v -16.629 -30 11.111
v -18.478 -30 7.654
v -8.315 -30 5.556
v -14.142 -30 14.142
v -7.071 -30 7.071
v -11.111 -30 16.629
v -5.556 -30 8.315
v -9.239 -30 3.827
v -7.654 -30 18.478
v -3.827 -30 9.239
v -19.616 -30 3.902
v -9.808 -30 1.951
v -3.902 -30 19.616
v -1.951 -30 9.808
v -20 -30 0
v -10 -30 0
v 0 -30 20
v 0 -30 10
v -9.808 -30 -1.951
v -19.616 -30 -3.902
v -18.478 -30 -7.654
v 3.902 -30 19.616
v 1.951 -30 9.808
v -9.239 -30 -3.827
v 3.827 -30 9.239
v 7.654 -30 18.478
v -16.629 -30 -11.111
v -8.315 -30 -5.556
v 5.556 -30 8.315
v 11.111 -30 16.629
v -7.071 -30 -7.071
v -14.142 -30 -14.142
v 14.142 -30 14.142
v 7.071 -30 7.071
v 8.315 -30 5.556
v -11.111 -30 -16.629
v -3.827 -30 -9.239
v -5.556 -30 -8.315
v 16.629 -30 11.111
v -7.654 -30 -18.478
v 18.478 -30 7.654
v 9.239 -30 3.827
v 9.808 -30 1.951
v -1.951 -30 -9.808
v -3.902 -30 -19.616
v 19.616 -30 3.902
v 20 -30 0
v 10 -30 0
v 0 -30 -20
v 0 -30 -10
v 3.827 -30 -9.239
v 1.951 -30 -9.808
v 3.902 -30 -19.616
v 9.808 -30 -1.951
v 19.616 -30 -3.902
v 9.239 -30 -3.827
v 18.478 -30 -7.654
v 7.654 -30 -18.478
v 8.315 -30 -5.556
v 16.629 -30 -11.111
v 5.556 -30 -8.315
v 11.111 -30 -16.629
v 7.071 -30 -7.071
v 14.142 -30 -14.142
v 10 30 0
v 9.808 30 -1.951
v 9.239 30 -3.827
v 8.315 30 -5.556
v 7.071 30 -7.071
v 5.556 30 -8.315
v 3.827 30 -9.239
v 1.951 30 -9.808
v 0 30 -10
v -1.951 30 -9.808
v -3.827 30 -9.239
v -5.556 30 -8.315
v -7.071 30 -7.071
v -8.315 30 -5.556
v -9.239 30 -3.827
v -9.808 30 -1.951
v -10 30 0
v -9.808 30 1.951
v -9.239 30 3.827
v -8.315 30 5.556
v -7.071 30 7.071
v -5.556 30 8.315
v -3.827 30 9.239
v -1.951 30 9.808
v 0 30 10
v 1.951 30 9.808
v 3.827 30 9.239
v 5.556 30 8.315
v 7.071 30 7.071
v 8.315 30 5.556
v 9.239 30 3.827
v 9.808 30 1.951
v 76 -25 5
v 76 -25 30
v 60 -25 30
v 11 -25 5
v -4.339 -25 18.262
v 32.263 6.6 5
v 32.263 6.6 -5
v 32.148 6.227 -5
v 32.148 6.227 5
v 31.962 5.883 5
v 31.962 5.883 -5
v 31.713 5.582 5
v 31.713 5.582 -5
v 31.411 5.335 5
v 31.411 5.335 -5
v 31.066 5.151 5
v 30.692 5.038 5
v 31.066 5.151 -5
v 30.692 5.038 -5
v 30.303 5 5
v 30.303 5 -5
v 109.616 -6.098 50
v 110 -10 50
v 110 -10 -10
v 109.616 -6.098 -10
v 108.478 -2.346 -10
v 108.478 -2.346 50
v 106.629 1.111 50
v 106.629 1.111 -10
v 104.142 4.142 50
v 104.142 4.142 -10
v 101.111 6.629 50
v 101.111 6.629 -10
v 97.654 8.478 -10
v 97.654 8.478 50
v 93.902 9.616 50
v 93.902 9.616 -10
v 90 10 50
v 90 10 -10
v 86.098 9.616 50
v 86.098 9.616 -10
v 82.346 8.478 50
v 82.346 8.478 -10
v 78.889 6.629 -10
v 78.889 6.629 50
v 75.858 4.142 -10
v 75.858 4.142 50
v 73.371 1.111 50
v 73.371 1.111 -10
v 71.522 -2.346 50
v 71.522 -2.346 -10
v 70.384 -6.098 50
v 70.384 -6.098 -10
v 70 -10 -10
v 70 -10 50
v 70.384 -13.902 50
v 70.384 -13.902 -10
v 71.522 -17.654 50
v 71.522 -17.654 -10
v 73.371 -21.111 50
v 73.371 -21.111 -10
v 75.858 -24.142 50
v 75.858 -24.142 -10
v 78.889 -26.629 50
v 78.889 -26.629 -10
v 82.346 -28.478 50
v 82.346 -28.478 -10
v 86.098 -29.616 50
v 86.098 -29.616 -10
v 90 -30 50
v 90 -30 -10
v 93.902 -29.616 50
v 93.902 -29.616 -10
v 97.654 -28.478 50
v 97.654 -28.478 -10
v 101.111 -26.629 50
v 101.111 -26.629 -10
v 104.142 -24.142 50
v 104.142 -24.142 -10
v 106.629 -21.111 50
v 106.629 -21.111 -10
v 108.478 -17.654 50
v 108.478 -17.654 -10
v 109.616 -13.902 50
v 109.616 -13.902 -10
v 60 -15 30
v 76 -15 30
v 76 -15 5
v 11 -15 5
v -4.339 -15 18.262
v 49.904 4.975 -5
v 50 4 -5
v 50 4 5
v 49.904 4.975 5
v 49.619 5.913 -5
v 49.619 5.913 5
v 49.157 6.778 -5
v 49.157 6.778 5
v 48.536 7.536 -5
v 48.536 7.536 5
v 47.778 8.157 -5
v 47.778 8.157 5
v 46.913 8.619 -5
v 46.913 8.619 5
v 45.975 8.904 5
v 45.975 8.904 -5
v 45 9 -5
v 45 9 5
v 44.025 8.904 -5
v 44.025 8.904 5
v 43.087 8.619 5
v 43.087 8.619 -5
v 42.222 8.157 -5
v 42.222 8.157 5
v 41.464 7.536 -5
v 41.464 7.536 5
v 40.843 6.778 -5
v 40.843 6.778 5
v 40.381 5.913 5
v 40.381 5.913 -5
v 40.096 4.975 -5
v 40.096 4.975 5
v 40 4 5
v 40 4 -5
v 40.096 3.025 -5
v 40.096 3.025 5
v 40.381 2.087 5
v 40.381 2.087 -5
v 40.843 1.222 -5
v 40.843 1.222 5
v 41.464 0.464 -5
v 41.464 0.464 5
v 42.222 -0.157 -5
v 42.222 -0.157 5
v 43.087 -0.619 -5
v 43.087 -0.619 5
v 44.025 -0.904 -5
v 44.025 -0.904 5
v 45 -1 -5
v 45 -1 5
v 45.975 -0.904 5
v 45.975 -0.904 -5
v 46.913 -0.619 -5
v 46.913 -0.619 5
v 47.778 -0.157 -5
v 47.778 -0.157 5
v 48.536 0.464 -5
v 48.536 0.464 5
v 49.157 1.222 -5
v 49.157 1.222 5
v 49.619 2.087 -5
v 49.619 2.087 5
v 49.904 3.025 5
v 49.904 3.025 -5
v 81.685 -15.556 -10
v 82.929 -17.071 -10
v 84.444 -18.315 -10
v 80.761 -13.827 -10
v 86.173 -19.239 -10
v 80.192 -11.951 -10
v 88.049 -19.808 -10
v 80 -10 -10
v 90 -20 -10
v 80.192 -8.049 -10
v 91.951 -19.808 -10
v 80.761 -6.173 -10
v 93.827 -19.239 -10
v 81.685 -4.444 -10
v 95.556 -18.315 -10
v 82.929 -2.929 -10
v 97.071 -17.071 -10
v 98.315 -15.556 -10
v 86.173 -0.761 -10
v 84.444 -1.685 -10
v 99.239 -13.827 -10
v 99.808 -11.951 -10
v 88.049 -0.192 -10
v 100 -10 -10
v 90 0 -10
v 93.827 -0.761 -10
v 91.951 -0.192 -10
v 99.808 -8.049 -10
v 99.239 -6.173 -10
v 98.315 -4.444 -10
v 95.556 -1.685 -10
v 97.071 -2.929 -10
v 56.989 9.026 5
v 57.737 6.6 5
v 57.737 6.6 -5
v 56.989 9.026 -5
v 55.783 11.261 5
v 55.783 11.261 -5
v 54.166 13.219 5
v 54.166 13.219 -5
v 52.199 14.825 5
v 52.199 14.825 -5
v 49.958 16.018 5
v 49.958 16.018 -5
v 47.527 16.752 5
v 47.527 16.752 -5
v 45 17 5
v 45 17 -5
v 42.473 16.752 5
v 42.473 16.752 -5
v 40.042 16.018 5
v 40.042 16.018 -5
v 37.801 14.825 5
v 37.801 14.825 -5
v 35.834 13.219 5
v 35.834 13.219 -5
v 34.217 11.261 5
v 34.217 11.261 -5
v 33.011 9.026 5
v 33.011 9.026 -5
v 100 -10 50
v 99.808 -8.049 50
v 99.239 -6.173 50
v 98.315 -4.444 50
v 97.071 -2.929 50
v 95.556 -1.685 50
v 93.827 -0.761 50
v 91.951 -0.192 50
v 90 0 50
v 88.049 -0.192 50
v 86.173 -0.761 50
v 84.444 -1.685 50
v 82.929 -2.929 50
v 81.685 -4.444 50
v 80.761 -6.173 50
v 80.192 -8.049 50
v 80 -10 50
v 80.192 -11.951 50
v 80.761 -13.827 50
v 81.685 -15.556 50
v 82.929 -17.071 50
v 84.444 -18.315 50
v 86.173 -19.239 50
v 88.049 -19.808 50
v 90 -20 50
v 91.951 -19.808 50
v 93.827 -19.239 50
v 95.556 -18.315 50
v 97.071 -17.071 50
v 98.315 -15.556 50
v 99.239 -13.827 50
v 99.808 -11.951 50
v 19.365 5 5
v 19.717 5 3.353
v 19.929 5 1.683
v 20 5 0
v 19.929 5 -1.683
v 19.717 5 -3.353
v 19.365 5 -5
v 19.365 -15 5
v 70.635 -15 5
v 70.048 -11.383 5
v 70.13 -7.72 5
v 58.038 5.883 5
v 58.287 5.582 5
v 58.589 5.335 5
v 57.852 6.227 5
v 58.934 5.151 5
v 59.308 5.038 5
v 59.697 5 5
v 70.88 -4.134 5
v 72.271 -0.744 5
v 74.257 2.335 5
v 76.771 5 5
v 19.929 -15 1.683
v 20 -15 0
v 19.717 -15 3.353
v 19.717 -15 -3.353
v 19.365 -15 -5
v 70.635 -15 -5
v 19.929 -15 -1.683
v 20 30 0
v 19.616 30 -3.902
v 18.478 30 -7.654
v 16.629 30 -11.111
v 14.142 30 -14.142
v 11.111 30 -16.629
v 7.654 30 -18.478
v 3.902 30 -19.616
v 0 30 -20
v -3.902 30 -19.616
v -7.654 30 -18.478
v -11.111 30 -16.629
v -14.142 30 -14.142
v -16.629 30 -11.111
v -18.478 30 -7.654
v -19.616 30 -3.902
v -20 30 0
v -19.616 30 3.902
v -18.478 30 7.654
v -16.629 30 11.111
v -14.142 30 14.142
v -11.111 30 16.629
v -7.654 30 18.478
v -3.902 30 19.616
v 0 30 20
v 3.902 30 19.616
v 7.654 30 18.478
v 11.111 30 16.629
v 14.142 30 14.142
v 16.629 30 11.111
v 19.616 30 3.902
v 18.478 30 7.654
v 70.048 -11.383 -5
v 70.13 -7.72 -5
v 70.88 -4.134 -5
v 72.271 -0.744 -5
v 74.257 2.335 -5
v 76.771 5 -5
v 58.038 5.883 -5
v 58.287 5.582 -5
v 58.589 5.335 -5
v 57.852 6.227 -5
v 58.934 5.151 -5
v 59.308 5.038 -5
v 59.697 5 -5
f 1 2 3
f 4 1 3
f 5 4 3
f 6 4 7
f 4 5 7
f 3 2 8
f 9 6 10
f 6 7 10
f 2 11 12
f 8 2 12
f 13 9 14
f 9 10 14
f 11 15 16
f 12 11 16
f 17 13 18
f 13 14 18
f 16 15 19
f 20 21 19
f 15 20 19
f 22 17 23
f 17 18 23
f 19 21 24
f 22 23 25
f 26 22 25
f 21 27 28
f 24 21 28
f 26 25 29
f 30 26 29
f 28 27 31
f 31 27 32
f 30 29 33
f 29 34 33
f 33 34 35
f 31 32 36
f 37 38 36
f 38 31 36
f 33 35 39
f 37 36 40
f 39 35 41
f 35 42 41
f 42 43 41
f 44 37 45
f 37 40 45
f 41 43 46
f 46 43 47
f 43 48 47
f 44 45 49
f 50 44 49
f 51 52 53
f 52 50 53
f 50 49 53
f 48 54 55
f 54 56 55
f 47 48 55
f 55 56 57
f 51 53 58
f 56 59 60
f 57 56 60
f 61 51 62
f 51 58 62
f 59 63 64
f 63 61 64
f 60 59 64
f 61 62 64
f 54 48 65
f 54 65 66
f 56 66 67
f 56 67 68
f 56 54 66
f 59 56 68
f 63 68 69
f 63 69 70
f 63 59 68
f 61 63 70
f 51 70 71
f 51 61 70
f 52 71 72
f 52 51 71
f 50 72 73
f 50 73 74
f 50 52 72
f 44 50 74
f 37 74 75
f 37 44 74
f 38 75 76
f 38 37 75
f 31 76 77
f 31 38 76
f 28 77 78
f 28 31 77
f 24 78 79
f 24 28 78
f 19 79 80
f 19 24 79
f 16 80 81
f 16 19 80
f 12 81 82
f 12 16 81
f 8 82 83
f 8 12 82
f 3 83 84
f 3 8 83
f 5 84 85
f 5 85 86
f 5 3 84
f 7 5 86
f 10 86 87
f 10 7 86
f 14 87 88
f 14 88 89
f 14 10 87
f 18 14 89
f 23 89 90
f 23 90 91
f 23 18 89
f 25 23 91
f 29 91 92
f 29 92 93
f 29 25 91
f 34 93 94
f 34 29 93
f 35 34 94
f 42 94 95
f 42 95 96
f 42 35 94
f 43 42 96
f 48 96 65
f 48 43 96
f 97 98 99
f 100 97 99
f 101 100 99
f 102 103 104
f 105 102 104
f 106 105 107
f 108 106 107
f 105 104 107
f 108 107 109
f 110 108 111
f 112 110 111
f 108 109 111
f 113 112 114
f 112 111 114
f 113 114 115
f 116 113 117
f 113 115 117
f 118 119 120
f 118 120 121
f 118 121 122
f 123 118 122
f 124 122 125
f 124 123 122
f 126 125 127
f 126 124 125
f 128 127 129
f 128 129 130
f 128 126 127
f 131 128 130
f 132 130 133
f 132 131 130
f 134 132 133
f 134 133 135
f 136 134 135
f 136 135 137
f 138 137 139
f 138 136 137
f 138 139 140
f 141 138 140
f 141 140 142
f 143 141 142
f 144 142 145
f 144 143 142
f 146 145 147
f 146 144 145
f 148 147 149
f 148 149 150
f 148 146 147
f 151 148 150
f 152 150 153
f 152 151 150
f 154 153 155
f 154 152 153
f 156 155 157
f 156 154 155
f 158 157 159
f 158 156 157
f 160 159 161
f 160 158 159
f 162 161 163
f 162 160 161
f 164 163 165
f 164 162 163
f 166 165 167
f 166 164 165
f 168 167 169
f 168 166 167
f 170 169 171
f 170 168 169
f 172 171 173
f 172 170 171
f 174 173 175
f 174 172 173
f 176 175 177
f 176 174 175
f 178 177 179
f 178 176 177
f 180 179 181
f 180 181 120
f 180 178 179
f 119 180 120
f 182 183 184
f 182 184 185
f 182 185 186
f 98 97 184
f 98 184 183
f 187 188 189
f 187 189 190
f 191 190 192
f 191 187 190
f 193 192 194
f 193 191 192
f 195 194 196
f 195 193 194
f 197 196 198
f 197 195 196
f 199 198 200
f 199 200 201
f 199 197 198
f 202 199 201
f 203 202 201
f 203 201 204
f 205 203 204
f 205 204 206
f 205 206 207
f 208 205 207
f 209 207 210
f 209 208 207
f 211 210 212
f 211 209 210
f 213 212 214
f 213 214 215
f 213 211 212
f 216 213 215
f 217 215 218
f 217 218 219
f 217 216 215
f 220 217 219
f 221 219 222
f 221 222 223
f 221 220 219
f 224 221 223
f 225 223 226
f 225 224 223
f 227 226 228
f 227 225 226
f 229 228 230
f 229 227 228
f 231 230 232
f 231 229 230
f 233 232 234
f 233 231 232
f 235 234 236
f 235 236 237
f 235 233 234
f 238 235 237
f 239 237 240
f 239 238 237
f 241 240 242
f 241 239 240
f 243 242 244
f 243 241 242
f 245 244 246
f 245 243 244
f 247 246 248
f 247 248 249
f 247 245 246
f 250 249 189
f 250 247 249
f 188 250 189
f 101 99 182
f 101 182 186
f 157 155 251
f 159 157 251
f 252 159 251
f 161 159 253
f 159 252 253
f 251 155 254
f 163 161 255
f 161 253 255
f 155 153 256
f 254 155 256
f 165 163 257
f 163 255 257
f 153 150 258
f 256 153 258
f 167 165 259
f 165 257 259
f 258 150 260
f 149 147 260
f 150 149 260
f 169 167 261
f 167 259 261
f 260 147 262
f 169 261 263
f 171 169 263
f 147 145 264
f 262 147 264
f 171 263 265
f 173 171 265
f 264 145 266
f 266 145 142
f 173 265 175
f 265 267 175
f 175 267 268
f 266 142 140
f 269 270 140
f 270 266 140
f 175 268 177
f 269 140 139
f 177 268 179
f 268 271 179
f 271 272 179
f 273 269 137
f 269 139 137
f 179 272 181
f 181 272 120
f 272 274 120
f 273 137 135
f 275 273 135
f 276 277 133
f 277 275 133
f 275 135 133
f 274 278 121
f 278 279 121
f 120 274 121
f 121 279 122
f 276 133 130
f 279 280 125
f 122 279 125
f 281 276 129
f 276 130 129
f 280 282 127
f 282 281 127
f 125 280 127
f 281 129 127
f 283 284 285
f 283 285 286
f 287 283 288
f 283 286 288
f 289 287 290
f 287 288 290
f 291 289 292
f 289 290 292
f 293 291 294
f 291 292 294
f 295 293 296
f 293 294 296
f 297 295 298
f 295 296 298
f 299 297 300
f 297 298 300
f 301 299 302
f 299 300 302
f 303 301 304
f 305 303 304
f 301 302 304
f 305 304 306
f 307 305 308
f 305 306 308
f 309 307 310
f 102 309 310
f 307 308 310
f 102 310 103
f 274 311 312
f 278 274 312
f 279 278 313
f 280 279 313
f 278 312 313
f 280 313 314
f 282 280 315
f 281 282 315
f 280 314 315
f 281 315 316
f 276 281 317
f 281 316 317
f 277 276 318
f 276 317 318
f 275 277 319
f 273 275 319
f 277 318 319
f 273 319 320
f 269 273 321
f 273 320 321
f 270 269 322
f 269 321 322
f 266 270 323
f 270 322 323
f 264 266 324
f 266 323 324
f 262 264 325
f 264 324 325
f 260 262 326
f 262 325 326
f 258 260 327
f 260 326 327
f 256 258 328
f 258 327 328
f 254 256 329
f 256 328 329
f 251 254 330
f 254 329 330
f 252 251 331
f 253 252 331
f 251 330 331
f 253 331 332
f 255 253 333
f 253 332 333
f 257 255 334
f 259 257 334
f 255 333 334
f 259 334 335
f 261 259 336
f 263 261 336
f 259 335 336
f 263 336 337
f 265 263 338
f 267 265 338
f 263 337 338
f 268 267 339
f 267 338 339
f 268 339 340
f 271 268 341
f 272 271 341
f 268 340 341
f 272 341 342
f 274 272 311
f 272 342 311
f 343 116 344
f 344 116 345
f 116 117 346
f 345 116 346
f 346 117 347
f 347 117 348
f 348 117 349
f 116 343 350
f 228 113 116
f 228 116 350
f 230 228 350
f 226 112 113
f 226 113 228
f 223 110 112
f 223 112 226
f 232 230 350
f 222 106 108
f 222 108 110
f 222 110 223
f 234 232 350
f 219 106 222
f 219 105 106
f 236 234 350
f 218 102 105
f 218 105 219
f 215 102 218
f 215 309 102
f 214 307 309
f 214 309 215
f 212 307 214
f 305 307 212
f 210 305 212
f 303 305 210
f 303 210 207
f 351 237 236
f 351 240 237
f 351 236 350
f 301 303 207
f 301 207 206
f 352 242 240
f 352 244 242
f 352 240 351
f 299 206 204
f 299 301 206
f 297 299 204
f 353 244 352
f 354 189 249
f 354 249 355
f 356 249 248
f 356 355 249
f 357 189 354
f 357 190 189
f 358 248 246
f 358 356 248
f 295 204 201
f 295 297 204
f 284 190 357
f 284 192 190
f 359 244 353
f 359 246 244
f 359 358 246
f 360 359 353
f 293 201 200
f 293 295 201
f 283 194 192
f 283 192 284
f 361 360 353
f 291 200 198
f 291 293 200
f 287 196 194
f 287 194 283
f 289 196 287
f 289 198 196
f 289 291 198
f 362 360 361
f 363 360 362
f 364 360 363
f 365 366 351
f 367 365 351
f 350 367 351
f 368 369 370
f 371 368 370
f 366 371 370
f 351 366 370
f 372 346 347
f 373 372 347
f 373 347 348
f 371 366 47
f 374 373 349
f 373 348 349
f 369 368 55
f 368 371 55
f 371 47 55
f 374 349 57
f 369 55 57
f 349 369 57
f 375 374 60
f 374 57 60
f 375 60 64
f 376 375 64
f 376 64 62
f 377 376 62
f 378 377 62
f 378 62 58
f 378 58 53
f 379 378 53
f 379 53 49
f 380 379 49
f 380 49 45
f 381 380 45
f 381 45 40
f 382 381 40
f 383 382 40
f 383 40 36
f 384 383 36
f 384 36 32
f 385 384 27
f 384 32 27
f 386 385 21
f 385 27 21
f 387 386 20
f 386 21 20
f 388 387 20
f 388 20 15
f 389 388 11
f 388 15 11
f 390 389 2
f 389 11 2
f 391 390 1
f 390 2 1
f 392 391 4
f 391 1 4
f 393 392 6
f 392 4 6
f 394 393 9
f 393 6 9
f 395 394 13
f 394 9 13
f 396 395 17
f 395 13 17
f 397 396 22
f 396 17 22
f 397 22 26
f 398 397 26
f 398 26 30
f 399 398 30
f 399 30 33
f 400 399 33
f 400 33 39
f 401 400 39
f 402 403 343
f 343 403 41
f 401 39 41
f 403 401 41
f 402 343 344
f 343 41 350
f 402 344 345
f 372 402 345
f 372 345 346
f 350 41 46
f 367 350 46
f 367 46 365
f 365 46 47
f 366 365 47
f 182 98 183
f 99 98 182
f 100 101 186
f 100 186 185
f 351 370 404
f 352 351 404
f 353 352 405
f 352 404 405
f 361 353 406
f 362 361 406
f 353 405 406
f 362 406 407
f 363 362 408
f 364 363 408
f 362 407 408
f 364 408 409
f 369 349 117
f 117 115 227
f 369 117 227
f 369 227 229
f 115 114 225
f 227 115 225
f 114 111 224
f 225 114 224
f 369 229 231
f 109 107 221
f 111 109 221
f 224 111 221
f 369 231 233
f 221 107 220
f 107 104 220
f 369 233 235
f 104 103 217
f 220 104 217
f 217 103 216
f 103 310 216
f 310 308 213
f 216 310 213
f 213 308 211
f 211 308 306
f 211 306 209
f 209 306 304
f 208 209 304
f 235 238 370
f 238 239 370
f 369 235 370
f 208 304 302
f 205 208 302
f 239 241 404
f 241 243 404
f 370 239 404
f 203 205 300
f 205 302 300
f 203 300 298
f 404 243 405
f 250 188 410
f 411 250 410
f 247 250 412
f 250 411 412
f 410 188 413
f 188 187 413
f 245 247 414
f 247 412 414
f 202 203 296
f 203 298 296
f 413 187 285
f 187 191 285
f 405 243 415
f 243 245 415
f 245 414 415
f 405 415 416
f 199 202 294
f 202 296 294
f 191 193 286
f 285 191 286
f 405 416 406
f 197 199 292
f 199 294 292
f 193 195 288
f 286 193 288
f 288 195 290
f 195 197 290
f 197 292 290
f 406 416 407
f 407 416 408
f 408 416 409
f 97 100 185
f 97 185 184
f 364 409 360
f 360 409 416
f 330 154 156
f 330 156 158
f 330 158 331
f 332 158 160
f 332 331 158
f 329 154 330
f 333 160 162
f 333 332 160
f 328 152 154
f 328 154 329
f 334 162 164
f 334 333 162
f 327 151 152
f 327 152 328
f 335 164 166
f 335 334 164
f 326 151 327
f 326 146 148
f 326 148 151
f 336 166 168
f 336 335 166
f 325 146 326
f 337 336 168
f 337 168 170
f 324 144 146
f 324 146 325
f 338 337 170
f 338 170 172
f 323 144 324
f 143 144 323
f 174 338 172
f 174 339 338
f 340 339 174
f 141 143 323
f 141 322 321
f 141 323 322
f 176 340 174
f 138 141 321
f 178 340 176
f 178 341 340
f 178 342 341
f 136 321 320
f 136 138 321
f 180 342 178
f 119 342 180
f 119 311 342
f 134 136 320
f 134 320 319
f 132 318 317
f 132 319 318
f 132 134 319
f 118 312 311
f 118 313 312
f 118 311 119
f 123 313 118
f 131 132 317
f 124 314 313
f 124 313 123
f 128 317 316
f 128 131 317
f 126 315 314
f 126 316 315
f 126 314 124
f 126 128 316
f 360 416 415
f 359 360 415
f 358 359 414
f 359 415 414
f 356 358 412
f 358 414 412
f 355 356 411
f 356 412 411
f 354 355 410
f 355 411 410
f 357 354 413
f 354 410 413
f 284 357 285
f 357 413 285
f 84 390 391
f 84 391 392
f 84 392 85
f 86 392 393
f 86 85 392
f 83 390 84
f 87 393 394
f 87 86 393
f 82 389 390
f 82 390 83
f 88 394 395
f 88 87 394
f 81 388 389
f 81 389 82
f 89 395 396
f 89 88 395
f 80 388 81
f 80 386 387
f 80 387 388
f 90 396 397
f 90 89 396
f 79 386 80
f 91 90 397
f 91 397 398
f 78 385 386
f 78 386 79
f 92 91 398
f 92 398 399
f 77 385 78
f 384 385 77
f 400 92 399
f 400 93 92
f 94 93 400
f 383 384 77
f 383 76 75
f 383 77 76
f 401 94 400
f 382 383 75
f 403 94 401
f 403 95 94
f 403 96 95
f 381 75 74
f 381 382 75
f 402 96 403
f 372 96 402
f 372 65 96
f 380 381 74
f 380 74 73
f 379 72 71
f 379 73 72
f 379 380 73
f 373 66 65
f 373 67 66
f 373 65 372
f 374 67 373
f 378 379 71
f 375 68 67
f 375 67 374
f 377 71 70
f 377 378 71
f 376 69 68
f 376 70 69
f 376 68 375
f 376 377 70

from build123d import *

# Parameters (mm, degrees)
SKETCH3_R         = 20
SKETCH3_R_2       = 10
CYL_BLUE_DEPTH    = 60
SKETCH4_R         = 5
BASE_YELLOW_DEPTH = 10
BASE_RED_DEPTH    = 10
SKETCH7_R         = 20
SKETCH7_R_2       = 10
CYL_PURPLE_DEPTH  = 60


with BuildPart() as part:
    # Sketch3 → cyl- blue (new body)
    with BuildSketch(Plane.XY.offset(50)):
        with Locations((90, -10)):
            Circle(SKETCH3_R)
        with Locations((90, -10)):
            Circle(SKETCH3_R_2, mode=Mode.SUBTRACT)
    extrude(amount=-CYL_BLUE_DEPTH)


with BuildPart() as body_2:
    # Sketch4 → base- yellow (new body)
    with BuildSketch(Plane.XY.offset(-5)):
        with BuildLine():
            Line((10, -15), (70.635083269, -15))
            ThreePointArc((70.635083269, -15), (70.879673523, -4.133730706), (76.771243445, 5))
            Line((76.771243445, 5), (59.696938457, 5))
            ThreePointArc((59.696938457, 5), (58.432027393, 5.450806662), (57.737346662, 6.6))
            ThreePointArc((57.737346662, 6.6), (45, 17), (32.262653338, 6.6))
            ThreePointArc((32.262653338, 6.6), (31.567972607, 5.450806662), (30.303061543, 5))
            Line((30.303061543, 5), (10, 5))
            Line((10, 5), (10, -15))
        make_face()
        with Locations((45, 4)):
            Circle(SKETCH4_R, mode=Mode.SUBTRACT)
    extrude(amount=BASE_YELLOW_DEPTH)

    # Sketch7 → cyl-purple (add)
    with BuildSketch(Plane(origin=(0, -30, 0), x_dir=(1, 0, 0), z_dir=(0, 1, 0))):
        Circle(SKETCH7_R)
        Circle(SKETCH7_R_2, mode=Mode.SUBTRACT)
    extrude(amount=CYL_PURPLE_DEPTH)


with BuildPart() as body_3:
    # Sketch6 → base-red (new body)
    with BuildSketch(Plane(origin=(0, -25, 0), x_dir=(1, 0, 0), z_dir=(0, 1, 0))):
        Polygon((11, -5), (76, -5), (76, -30), (60, -30), (-4.339296012, -18.261867577), align=None)
    extrude(amount=BASE_RED_DEPTH)


solid = Compound([part.part, body_2.part, body_3.part])
